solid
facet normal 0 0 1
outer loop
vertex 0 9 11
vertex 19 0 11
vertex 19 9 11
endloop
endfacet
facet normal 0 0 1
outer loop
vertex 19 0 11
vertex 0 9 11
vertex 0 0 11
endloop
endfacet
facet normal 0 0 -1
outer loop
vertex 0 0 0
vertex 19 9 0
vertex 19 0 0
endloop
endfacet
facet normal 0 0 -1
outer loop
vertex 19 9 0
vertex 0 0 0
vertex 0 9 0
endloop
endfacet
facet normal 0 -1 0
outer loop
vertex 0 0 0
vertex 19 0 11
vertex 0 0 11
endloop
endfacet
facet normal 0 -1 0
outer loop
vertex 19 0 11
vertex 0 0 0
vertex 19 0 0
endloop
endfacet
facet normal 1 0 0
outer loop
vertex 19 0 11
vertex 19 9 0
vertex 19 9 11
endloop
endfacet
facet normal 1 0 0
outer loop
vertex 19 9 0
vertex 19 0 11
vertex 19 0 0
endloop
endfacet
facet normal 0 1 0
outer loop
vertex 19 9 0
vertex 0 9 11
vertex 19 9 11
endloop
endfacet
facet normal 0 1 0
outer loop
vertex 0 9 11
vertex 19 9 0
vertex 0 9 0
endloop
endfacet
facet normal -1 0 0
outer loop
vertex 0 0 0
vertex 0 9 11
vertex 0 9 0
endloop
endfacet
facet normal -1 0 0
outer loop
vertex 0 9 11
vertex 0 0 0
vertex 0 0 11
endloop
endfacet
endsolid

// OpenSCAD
// Generated by SolidPython 1.0.1 on 2020-07-29 00:46:56


cube(size = [19, 9, 11]);
/***********************************************
*********      SolidPython code:      **********
************************************************
 
# import packages: SolidPython
from solid import *
from solid.utils import *
from itertools import chain, combinations, permutations


class Resize:

    def __init__(self, scad_file):
        self.scad_file = scad_file
        #self.scad_file = import_scad(scad_file)
        # cone/cylinder param:
        self.r1 = 0
        self.r2 = 0
        self.h = 0
        # rectangular prism param:
        self.w = 0
        self.l = 0
        # ellipse param:
        self.r = 0

    # import OpenScad code (file name corresponds to shape)


    # classify shape + parameters
    def assign(self, param1, param2, param3):
        if self.scad_file == 'cone.scad':
            self.r1 = param1
            self.r2 = param2
            self.h = param3
        elif self.scad_file == 'cylinder.scad':
            self.r1 = param1
            self.r2 = param2
            self.h = param3
        elif self.scad_file == 'rectangularPrism.scad':
            self.h = param1
            self.l = param2
            self.w = param3
        else:
            self.r = param1
            self.h = param2

    # resize parameters
    def iterate(self):
        x = range(3, 20, 2)
        i = 1
        if self.scad_file == 'cone.scad':
            tempList = list(permutations(x, 2))
            for temp in tempList:
                param1 = temp[0]
                param2 = temp[1]
                filepath = 'produced_scad_files/' + 'cone' + str(param1) + '_' + str(param2) + '_' + '.scad'
                scad_render_to_file(cylinder(h=param1, r1=param2, r2=0), filepath)

        elif self.scad_file == 'cylinder.scad':
            tempList = list(permutations(x, 3))
            for temp in tempList:
                param1 = temp[0]
                param2 = temp[1]
                filepath = 'produced_scad_files/' + 'cylinder' + str(param1) + '_' + str(param2) + '_' + '.scad'
                scad_render_to_file(cylinder(h=param1, r1=param2, r2=param2), filepath)

        elif self.scad_file == 'rectangularPrism.scad':
            tempList = list(permutations(x, 3))
            for temp in tempList:
                param1 = temp[0]
                param2 = temp[1]
                param3 = temp[2]
                filepath = 'produced_scad_files/' + 'rectangularPrism' + str(param1) + '_' + str(param2) + '_' + str(
                    param3) + '.scad'
                scad_render_to_file(cube(size=(param1, param2, param3)), filepath)

        elif self.scad_file == 'ellipse.scad':
            tempList = list(permutations(x, 4))
            for temp in tempList:
                param1 = temp[0]
                param2 = temp[1]
                param3 = temp[2]
                param4 = temp[3]
                filepath = 'produced_scad_files/' + 'ellipse' + str(param1) + '_' + str(param2) + '_' + str(param3) + '_' + str(param4) + '.scad'
                scad_render_to_file(scale([param1, param2, param3])(sphere(r=param4)), filepath)

    def render_to_scadfile(self):
        scad_render_to_file(scad, 'example.scad') 
 
************************************************/
